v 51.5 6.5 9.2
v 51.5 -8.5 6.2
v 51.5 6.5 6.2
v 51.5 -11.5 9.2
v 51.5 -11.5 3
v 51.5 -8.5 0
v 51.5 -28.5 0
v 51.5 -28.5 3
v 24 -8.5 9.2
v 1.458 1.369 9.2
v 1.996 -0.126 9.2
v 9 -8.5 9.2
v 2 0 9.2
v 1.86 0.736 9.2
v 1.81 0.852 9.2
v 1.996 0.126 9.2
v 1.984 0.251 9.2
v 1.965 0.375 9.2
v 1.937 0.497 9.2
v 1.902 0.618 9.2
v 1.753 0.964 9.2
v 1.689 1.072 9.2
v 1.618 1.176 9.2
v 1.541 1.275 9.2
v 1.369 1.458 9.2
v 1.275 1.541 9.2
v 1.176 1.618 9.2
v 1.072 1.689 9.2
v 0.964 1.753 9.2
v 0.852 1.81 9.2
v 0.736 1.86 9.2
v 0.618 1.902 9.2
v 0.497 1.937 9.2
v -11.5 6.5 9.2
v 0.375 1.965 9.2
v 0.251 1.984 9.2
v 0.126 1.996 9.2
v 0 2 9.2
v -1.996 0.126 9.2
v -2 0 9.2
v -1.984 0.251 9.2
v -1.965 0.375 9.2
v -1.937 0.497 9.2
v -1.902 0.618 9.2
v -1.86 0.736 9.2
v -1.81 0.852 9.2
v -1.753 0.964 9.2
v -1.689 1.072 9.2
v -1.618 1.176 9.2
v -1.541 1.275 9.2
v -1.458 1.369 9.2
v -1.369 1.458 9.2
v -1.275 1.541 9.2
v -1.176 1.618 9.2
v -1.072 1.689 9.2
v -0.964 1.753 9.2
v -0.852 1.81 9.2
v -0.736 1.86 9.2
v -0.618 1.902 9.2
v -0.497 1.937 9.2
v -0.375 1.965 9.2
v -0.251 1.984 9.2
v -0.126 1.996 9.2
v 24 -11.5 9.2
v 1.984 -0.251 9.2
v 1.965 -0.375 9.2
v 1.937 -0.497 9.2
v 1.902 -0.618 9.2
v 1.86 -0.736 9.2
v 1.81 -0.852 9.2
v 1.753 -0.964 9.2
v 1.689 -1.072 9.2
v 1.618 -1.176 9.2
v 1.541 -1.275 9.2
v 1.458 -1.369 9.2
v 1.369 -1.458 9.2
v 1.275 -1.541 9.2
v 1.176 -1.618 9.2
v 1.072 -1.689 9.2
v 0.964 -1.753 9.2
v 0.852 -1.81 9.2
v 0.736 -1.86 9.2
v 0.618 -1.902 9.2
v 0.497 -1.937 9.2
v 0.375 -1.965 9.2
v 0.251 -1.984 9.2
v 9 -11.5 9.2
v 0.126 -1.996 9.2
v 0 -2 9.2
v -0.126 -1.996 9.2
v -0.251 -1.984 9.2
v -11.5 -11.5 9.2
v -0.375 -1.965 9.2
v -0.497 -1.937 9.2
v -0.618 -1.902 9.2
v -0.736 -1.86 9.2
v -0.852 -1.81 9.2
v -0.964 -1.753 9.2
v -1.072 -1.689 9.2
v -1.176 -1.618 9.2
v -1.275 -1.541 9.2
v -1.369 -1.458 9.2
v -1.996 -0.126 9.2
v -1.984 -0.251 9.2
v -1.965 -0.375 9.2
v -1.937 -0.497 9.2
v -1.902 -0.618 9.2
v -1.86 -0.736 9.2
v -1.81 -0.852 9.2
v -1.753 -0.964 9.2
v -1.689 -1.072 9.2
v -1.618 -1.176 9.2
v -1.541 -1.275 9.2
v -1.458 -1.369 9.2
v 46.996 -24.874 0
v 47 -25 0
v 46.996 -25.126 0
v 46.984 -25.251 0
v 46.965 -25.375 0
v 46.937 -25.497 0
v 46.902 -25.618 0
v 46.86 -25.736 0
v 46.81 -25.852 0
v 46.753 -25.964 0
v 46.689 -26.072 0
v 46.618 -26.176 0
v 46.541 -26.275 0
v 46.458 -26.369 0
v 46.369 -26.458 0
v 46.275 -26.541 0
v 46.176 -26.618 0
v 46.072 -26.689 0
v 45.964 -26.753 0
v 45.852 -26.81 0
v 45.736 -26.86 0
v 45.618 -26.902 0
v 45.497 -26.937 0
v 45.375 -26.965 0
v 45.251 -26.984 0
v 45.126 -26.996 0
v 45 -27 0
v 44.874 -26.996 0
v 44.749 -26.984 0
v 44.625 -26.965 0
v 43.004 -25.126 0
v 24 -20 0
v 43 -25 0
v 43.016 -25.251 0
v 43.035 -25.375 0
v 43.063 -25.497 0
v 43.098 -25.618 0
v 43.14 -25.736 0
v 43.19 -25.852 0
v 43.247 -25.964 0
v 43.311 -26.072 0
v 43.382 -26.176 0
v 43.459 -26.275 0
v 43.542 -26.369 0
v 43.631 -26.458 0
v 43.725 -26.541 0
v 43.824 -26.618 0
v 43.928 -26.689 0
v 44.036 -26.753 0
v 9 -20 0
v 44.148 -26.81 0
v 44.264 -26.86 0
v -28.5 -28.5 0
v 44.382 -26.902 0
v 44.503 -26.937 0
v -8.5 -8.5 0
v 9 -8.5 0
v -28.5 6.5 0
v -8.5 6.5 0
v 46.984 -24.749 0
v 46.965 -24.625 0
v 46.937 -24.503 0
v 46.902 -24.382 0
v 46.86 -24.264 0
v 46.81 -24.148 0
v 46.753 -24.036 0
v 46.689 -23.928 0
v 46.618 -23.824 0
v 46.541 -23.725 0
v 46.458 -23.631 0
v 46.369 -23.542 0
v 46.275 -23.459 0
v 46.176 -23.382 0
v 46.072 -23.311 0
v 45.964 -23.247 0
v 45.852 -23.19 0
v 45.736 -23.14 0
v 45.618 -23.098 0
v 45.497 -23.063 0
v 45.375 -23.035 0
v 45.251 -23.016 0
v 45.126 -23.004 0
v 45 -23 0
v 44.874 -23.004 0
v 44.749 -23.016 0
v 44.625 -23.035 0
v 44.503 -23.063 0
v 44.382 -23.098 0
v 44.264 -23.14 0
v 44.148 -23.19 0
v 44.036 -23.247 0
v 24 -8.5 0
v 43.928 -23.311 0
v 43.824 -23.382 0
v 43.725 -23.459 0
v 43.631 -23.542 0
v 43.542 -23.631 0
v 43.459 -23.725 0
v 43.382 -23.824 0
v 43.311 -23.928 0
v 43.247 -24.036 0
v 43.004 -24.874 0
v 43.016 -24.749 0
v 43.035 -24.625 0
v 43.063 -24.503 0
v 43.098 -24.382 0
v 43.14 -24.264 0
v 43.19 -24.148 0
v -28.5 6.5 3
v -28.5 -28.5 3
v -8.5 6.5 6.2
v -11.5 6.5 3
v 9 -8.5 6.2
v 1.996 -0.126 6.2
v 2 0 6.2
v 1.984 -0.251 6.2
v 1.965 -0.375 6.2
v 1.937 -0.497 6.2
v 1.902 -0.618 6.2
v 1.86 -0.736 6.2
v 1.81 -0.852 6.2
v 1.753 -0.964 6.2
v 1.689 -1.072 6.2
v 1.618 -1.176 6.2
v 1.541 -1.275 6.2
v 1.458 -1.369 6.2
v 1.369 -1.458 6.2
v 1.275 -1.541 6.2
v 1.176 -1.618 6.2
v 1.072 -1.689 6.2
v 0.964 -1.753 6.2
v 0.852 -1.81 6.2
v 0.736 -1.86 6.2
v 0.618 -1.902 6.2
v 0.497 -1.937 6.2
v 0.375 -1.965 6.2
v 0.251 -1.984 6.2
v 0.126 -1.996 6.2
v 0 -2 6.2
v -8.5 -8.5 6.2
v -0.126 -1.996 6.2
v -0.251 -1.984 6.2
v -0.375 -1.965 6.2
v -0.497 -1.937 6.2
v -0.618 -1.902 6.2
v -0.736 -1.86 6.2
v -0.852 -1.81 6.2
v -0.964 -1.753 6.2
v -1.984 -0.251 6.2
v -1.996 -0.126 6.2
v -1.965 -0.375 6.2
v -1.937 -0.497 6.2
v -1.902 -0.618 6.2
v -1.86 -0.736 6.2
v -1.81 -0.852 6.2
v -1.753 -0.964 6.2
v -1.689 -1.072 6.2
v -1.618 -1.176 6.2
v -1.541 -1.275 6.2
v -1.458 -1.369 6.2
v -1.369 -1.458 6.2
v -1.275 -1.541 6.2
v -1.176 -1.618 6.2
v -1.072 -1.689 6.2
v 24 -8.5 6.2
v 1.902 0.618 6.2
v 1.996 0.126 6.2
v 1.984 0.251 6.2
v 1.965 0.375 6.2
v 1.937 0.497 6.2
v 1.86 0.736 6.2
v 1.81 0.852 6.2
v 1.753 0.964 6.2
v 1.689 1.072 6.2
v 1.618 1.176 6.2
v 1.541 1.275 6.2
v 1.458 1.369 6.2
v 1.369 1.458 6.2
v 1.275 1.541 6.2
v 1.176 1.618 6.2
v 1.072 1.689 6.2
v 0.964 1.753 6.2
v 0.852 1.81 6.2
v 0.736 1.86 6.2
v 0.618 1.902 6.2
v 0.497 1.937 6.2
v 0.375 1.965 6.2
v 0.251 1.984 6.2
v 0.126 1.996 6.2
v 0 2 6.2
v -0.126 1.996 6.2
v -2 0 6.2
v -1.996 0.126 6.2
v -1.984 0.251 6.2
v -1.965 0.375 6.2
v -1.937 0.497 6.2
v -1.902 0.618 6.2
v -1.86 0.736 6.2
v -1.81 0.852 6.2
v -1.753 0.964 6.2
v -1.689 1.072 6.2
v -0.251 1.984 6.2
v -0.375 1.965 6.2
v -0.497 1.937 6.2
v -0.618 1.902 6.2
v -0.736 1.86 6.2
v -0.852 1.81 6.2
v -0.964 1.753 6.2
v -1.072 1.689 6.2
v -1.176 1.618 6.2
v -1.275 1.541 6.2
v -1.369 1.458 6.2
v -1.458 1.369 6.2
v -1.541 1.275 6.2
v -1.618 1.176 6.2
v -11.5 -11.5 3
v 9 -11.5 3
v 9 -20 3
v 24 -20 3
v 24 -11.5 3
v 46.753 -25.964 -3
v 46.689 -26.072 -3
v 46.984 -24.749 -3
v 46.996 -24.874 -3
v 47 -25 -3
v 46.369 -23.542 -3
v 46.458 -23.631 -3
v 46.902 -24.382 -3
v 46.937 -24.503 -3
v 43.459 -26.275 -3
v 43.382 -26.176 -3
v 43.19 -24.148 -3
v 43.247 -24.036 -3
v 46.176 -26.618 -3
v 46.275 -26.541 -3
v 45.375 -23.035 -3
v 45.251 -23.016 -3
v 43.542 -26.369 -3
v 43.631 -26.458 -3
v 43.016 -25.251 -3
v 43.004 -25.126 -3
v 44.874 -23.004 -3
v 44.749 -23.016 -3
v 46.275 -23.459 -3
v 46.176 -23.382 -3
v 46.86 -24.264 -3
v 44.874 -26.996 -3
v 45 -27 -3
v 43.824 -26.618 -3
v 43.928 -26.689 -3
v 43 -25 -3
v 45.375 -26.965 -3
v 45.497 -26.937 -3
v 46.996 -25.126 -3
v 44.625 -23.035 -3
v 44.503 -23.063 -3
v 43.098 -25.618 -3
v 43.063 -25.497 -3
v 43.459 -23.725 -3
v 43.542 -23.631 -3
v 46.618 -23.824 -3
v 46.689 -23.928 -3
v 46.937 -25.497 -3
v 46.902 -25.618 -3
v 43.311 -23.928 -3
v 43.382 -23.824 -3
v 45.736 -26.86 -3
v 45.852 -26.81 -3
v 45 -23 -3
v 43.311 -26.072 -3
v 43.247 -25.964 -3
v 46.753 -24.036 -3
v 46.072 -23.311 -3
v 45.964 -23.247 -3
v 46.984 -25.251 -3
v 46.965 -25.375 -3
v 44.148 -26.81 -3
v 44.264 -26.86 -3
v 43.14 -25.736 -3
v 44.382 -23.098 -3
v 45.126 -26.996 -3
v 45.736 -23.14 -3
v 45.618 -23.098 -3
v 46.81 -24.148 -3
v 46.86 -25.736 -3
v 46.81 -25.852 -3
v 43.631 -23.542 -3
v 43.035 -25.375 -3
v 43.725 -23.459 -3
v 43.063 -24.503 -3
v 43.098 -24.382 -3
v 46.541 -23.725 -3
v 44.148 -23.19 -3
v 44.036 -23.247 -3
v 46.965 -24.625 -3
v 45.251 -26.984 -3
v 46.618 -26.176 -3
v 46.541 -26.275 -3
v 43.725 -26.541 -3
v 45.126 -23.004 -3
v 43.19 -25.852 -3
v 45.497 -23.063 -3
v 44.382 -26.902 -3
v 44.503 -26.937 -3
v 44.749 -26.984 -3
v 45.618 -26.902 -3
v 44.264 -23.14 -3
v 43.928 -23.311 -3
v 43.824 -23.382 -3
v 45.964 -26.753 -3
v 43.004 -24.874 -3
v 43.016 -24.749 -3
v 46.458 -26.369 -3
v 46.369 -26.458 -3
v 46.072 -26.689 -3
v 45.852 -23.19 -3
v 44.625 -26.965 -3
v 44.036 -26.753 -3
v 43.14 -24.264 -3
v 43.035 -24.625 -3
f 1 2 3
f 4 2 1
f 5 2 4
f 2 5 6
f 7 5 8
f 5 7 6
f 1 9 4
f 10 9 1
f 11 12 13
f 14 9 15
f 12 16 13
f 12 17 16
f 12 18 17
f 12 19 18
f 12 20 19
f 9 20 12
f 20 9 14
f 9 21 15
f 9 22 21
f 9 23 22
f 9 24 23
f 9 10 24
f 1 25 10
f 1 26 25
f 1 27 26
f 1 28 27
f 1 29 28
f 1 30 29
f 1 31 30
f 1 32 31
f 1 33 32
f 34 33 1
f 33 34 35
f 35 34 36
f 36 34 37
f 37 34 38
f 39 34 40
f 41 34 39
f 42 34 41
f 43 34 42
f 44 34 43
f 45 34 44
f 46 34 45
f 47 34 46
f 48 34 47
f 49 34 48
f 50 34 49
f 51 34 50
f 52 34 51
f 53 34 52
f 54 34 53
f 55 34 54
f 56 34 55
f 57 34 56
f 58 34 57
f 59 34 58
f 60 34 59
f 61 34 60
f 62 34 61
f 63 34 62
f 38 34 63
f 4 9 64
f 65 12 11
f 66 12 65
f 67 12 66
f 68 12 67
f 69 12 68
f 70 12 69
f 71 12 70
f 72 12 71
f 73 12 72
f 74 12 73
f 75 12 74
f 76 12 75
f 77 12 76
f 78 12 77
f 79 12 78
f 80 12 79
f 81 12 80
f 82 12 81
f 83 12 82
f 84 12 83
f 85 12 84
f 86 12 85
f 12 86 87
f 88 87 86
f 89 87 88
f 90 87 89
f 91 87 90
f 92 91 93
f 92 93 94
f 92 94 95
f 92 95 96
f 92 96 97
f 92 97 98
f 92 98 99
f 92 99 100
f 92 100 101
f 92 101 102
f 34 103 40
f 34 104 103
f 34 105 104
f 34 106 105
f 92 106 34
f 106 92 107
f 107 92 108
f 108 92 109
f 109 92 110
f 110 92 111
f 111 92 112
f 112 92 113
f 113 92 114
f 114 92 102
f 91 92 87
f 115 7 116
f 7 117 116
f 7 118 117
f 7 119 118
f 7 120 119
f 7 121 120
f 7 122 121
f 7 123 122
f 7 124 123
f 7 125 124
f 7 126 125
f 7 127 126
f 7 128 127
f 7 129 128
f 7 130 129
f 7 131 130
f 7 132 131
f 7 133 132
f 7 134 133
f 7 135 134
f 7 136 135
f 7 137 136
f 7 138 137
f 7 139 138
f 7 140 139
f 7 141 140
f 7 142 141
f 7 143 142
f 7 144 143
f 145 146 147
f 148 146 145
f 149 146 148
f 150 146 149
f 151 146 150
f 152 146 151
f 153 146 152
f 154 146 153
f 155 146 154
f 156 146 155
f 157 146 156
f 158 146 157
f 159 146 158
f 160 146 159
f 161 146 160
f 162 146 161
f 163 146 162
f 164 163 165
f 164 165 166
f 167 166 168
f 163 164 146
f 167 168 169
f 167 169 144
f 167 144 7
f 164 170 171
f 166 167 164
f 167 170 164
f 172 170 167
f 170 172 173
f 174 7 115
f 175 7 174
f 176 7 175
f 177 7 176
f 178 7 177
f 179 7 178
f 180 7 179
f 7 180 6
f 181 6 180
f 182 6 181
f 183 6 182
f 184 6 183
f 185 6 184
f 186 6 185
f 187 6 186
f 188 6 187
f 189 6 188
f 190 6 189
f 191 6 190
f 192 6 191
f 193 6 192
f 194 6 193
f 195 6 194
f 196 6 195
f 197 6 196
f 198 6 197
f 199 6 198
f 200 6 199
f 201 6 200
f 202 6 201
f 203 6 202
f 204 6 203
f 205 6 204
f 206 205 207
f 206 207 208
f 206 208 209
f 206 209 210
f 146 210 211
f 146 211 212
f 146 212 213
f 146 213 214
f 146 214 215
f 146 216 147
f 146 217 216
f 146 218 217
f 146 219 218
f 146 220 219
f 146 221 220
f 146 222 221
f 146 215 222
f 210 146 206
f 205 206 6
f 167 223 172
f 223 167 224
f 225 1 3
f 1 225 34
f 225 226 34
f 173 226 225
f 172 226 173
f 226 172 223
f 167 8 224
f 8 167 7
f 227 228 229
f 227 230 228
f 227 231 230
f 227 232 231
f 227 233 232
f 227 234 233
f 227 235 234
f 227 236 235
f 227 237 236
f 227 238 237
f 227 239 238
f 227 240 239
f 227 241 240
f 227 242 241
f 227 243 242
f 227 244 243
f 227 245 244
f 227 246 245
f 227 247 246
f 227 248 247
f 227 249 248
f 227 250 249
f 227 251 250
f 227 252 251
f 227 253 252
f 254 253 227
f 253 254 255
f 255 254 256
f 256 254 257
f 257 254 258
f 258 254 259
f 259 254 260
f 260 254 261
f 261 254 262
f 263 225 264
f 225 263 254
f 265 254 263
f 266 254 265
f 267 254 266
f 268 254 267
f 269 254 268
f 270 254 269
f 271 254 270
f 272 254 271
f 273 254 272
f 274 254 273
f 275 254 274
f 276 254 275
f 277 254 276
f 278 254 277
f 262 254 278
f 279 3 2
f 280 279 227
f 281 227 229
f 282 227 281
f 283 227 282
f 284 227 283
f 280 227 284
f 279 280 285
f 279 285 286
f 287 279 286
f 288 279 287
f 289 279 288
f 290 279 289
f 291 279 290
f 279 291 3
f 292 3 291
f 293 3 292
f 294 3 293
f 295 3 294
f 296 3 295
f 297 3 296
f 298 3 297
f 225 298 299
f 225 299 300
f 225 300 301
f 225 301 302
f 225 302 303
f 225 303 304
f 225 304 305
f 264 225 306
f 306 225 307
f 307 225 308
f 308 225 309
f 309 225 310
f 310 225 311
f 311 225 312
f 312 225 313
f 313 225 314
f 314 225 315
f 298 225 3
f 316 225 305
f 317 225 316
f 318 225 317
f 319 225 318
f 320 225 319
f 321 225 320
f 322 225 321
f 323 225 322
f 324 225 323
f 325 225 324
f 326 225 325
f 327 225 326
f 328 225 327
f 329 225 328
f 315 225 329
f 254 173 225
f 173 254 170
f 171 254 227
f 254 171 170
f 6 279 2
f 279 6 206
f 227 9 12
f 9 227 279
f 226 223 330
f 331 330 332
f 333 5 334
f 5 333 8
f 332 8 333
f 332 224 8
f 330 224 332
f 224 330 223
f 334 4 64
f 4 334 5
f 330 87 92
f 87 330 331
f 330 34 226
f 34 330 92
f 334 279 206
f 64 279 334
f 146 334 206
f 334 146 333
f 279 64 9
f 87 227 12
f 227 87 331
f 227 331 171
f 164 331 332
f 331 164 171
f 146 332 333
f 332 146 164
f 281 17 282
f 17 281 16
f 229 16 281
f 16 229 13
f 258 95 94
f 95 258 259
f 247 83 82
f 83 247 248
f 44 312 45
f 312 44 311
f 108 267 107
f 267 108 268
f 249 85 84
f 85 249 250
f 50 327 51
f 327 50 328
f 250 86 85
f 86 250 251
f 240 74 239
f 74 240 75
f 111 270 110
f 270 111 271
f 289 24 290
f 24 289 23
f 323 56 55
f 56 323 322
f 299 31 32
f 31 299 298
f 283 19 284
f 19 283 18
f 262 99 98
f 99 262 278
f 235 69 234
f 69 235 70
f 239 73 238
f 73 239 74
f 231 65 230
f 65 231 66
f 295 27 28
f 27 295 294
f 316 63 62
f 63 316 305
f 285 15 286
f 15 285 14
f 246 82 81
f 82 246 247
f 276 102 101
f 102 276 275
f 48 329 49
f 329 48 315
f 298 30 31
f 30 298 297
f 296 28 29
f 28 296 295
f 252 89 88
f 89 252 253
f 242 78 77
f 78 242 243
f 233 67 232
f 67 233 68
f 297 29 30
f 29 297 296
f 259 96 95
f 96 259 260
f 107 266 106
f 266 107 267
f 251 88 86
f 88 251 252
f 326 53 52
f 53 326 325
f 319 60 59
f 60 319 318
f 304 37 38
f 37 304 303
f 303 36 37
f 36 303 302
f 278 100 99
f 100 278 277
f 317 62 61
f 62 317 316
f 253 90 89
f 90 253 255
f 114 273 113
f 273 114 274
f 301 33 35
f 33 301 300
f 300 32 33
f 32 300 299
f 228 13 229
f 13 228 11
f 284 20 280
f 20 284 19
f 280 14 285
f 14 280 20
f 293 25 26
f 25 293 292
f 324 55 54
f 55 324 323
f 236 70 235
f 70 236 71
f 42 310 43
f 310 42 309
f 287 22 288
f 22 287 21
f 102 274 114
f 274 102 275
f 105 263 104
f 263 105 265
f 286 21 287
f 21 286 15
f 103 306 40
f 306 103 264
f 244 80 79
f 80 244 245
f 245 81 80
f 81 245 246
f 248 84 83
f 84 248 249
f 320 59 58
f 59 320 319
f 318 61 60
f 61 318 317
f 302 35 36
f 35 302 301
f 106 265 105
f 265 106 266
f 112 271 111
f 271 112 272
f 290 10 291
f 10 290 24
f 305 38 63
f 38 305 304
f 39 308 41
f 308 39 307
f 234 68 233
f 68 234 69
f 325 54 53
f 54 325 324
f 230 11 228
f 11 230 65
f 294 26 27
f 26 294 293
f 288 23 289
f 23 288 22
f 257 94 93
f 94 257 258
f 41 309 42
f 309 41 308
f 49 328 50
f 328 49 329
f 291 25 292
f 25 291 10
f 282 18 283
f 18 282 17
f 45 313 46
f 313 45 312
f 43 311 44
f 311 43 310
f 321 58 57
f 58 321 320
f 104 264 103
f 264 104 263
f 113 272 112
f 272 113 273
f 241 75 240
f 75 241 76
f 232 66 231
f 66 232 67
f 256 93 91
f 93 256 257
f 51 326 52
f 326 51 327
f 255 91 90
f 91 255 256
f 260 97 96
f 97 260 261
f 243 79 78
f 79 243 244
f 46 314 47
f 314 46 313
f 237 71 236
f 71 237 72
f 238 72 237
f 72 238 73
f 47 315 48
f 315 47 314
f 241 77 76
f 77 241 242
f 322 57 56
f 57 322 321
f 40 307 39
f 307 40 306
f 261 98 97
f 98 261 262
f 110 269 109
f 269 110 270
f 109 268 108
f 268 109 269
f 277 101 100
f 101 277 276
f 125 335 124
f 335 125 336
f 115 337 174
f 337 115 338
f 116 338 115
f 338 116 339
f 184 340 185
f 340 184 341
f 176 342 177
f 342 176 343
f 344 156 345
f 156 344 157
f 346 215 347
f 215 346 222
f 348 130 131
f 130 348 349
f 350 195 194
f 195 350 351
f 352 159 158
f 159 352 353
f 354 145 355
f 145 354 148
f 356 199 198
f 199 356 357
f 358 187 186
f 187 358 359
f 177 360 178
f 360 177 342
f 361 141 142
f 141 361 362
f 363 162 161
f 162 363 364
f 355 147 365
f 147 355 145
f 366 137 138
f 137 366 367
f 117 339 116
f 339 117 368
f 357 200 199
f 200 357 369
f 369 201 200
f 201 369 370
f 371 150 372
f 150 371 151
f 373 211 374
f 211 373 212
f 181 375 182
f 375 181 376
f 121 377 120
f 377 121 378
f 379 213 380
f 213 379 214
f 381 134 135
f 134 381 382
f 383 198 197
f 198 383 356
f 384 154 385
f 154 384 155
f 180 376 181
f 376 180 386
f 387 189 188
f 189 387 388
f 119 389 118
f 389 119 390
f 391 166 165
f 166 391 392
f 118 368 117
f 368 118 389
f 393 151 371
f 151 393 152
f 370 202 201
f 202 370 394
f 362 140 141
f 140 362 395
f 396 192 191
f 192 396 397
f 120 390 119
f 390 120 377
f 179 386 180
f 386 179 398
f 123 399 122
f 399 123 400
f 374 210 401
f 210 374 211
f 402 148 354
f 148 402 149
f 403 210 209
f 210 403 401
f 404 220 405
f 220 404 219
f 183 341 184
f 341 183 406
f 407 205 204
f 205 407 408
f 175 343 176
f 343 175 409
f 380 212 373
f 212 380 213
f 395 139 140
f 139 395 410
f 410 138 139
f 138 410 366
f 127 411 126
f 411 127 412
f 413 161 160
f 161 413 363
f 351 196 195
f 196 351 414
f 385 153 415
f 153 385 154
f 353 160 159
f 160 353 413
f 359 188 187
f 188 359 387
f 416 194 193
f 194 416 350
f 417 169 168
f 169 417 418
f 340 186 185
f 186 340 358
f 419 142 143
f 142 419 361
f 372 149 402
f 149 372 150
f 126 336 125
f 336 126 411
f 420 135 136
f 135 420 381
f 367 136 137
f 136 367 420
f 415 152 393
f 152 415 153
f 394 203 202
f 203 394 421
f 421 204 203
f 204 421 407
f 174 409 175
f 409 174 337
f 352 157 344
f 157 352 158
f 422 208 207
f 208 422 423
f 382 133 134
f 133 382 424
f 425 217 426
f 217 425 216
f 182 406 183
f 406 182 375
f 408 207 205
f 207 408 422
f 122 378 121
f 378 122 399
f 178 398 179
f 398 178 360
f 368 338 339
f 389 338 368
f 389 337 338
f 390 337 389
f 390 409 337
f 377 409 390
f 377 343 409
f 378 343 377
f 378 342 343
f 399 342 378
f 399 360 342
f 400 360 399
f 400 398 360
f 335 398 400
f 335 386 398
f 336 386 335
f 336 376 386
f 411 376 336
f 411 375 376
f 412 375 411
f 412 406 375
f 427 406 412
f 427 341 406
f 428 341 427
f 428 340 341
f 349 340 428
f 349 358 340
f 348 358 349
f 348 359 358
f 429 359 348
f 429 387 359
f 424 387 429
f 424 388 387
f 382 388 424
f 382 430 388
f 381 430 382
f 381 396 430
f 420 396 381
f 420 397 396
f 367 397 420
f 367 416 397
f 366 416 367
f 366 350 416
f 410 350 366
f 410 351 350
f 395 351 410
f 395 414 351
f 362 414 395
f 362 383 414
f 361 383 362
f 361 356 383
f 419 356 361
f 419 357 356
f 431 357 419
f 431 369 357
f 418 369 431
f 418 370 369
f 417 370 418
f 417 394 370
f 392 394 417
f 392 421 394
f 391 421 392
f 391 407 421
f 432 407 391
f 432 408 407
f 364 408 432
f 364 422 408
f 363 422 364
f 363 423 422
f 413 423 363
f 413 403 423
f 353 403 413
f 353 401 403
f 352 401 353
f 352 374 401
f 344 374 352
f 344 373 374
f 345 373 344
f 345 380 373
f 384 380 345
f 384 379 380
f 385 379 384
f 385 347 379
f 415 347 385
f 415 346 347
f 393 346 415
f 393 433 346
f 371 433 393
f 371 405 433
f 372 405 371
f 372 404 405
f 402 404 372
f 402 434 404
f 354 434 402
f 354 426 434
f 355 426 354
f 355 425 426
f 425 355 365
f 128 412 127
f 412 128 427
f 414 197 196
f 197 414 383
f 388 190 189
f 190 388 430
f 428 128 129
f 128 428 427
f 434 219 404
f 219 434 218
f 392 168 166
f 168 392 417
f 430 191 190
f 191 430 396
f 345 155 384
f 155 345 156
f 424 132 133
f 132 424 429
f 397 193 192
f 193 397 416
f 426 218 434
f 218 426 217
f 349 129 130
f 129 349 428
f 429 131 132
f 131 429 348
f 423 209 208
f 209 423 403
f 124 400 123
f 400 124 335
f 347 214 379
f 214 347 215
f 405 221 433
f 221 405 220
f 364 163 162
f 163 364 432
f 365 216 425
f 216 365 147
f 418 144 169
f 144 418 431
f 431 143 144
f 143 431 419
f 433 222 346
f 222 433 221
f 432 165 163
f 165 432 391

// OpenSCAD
$fa = 6;
$fs = 0.2;
$fn = 100;
ep_plexi=6.2;
ep_support=3;
dia_axe = 4;
longueur=60;
largeur=15;
base=20;
x_axe=8.5;
dia_centrage=5;
h_centrage=3;

longueur_ht=longueur+base;
largeur_ht=largeur+base;
hauteur_ht = ep_plexi+ep_support;

module support() {
    difference() {
        translate([-x_axe, -x_axe, 0]) {
            difference() {
	        translate([-base, -base, 0]) cube([longueur_ht, largeur_ht, hauteur_ht]);
	        cube([longueur+1, largeur+1, ep_plexi]);
	        translate([-base-1, -base-1, ep_support]) cube([longueur_ht+2, base-ep_support+1, hauteur_ht]);
	        translate([-base-1, -base-1, ep_support]) cube([base-ep_support+1, largeur_ht+2, hauteur_ht]);
	        l_vis = (base+ep_support)/2;
	        translate([25, -(l_vis)/2, hauteur_ht/2]) cube([15, l_vis, hauteur_ht+2], center=true);
            };
        };
        translate([0,0,-h_centrage]) cylinder(d=dia_axe, h=hauteur_ht+h_centrage+1);
    }
    translate([45,-25,-h_centrage]) cylinder(d=dia_axe, h=h_centrage);
};

support();
//projection(cut = true) translate([0,0,-1]) support();
//projection(cut = true) translate([0,0,1]) support();
